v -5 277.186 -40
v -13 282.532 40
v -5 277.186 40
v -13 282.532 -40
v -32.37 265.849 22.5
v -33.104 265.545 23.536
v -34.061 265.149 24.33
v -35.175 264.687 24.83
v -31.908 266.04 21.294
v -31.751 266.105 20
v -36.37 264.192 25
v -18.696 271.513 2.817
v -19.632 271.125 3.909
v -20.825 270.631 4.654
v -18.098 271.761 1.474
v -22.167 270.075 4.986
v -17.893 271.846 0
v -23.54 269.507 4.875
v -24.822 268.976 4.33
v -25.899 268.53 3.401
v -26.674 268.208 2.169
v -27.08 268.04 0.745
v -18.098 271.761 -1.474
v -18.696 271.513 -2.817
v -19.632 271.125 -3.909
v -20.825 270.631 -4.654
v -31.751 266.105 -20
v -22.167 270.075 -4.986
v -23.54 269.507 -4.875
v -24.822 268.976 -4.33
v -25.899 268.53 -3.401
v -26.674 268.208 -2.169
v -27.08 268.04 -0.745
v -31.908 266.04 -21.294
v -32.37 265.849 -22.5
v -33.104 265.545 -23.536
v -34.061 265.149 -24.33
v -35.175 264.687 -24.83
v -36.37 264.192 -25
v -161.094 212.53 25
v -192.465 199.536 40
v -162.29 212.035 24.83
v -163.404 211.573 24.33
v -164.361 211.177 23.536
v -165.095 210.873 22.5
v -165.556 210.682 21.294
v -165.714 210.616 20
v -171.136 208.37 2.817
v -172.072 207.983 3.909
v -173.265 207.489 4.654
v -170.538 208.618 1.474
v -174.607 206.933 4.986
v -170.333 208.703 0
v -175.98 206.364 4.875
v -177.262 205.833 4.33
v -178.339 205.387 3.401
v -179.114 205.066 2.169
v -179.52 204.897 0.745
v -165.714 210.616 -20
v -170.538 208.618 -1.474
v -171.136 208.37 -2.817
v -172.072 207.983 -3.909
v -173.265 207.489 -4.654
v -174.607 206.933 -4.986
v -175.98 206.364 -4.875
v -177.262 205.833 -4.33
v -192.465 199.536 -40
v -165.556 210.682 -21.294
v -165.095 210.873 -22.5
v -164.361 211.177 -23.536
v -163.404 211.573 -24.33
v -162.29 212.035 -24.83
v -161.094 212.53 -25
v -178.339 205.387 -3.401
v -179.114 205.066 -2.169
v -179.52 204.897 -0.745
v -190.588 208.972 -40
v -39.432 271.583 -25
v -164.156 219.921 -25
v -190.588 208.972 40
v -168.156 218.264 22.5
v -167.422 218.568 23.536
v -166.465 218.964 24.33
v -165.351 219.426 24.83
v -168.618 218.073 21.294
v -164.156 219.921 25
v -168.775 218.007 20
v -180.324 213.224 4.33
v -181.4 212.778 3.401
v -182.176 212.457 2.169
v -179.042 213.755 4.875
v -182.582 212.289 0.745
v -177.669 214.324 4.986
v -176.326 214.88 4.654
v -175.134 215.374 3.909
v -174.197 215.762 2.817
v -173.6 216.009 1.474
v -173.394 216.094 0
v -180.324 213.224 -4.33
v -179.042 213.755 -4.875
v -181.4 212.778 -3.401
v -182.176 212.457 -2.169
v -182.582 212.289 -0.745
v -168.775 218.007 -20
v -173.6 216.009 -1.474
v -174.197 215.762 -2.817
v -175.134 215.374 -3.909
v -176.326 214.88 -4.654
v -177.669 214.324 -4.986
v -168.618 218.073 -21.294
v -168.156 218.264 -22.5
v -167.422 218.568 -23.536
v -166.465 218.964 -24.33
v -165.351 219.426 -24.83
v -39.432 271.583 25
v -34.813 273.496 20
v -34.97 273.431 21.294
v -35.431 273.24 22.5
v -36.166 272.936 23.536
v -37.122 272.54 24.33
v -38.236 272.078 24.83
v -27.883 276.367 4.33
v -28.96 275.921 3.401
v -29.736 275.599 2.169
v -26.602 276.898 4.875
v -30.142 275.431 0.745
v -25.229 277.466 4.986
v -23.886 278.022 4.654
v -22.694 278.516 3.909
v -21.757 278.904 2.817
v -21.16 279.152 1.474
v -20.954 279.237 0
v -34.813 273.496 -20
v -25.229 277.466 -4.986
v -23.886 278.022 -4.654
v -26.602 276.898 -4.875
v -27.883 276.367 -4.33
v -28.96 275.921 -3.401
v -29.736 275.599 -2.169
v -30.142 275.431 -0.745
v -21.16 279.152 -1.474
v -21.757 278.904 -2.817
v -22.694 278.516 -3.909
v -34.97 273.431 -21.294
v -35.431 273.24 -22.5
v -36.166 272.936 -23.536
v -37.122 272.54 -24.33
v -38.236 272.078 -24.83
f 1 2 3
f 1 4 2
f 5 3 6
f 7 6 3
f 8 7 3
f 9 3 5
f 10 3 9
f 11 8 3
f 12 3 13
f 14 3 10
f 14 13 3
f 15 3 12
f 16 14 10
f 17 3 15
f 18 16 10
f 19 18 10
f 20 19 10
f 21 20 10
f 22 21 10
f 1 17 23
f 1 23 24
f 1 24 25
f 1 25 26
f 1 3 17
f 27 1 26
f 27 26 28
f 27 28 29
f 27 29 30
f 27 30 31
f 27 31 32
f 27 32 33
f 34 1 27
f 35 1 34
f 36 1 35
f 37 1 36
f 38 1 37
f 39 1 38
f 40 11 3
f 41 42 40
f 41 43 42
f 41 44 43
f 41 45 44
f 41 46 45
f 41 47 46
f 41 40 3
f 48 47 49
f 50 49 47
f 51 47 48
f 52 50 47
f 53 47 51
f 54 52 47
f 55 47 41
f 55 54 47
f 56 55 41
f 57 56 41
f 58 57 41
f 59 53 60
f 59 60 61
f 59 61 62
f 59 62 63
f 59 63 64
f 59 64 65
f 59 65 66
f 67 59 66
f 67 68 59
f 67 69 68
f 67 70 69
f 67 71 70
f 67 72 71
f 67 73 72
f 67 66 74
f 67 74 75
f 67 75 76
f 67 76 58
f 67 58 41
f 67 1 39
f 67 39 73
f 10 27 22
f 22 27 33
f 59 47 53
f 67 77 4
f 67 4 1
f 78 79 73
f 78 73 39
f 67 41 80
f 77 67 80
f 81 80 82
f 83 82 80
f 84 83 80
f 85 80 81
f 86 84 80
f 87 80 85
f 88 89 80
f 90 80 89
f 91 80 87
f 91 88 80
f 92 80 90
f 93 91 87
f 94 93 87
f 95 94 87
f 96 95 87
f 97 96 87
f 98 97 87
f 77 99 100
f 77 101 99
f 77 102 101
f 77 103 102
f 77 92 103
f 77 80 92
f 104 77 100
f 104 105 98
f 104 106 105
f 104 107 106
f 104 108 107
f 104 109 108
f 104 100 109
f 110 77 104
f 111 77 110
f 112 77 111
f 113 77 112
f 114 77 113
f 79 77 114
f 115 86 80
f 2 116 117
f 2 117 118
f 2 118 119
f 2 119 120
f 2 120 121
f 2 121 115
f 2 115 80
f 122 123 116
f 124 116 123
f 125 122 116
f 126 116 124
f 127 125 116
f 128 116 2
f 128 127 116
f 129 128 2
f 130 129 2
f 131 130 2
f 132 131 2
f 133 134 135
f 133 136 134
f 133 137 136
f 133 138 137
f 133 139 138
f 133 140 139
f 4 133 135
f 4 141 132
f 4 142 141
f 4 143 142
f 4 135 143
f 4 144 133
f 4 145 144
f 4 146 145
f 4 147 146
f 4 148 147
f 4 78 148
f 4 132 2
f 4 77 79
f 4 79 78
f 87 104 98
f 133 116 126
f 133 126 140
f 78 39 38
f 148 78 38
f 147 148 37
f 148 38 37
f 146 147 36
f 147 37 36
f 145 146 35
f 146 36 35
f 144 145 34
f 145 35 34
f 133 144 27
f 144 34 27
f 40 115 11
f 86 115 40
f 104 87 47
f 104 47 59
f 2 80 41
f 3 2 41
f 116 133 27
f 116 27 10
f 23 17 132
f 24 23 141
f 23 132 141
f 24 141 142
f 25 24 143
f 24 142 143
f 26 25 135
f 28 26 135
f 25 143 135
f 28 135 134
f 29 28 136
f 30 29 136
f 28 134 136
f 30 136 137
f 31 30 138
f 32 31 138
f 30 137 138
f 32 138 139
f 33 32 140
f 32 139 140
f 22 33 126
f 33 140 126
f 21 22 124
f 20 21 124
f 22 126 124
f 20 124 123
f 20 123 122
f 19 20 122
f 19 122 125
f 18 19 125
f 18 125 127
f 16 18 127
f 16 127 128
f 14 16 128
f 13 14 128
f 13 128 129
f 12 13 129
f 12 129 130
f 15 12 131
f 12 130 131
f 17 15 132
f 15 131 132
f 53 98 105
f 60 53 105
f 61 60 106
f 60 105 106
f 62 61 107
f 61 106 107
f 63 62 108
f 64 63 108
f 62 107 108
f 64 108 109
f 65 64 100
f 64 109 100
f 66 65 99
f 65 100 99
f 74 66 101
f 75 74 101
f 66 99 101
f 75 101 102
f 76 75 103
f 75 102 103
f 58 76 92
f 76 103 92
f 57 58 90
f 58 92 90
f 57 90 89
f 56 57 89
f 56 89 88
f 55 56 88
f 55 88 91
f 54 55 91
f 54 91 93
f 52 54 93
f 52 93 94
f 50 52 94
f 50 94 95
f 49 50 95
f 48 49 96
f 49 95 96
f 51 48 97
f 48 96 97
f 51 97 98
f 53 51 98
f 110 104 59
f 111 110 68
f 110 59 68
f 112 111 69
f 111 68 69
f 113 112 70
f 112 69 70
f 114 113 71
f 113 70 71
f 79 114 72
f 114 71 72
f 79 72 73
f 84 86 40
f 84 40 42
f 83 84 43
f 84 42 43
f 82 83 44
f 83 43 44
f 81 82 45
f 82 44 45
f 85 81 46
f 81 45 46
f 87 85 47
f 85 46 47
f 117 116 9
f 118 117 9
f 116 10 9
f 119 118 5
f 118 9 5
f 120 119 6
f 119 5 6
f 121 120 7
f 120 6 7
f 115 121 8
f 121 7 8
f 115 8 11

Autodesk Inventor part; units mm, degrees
ref_plane "YZ Plane" through (0, 0, 0) normal (1, 0, 0) x (0, 1, 0)
ref_plane "XZ Plane" through (0, 0, 0) normal (0, 1, 0) x (-1, 0, 0)
ref_plane "XY Plane" through (0, 0, 0) normal (0, 0, 1) x (1, 0, 0)
sketch "Sketch2" plane through (0, 0, 0) normal (0, 0, 1) x (1, 0, 0)
  line L0 (0, 273.8452) -> (193.6378, 193.6378) construction
  line L1 (193.6378, 193.6378) -> (273.8452, 0) construction
  line L2 (273.8452, 0) -> (193.6378, -193.6378) construction
  line L3 (193.6378, -193.6378) -> (0, -273.8452) construction
  line L4 (0, -273.8452) -> (-193.6378, -193.6378) construction
  line L5 (-193.6378, -193.6378) -> (-273.8452, 0) construction
  line L6 (-273.8452, 0) -> (-193.6378, 193.6378) construction
  line L7 (-193.6378, 193.6378) -> (0, 273.8452) construction
  line L8 (-193.6378, 193.6378) -> (0, 273.8452) construction
  line L9 (-459.9272, 770.6562) -> (-219.7185, 870.1539) construction
  line L10 (-96.8189, 233.7415) -> (-339.8229, 820.405) construction
  line L11 (-219.7185, 870.1539) -> (0, 870.1539) construction
  line L12 (0, 870.1539) -> (0, 273.8452) construction
  line L13 (-459.9272, 770.6562) -> (-615.2917, 615.2917) construction
  line L14 (-615.2917, 615.2917) -> (-193.6378, 193.6378) construction
  line L15 (-5, 277.1861) -> (-192.4647, 199.5357) construction
  line L16 (-192.4647, 199.5357) -> (-608.2206, 615.2917) construction
  line L17 (-608.2206, 615.2917) -> (-457.095, 766.4174) construction
  line L18 (-457.095, 766.4174) -> (-218.724, 865.1539) construction
  line L19 (-218.724, 865.1539) -> (-5, 865.1539) construction
  line L20 (-5, 865.1539) -> (-5, 277.1861) construction
  line L21 (-13, 282.5315) -> (-190.5876, 208.9724) construction
  line L22 (-190.5876, 208.9724) -> (-596.9069, 615.2917) construction
  line L23 (-596.9069, 615.2917) -> (-452.5633, 759.6353) construction
  line L24 (-452.5633, 759.6353) -> (-217.1327, 857.1539) construction
  line L25 (-217.1327, 857.1539) -> (-13, 857.1539) construction
  line L26 (-13, 857.1539) -> (-13, 282.5315) construction
  line L27 (-5, 277.1861) -> (-192.4647, 199.5357)
  line L28 (-192.4647, 199.5357) -> (-190.5876, 208.9724)
  line L29 (-190.5876, 208.9724) -> (-13, 282.5315)
  line L30 (-13, 282.5315) -> (-5, 277.1861)
  point P0 (0, 0)
  point P1 (0, 0)
  point P2 (0, 0)
  dimension "d0" = 506
  dimension "d1" = 260
  dimension "d2" = 635
  dimension "d6" = 5
  dimension "d7" = 8
extrude "Extrusion1" add sketch "Sketch2" along normal mid plane 80
sketch "Sketch3" plane through (-13, 282.5315, -40) normal (-0.3827, 0.9239, 0) x (0.9239, 0.3827, 0)
  line L0 (-168.6097, -15) -> (-23.6097, -15)
  line L1 (-23.6097, -15) -> (-23.6097, -65)
  line L2 (-23.6097, -65) -> (-168.6097, -65)
  line L3 (-168.6097, -65) -> (-168.6097, -15)
  circle A0 centre (-13.6097, -40) radius 5
  circle A1 centre (-178.6097, -40) radius 5
  line L4 (0, -80) -> (-192.2194, -80) projected
  line L5 (-96.1097, -40) -> (-96.1097, -80) construction
  line L6 (5.3454, 0) -> (5.3454, -80) construction
  point P0 (-96.1097, -15)
  point P1 (-168.6097, -40)
  point P2 (-23.6097, -40)
  point P3 (5.3454, -40)
  dimension "d10" = 145
  dimension "d11" = 10
  dimension "d12" = 10
  dimension "d13" = 50
extrude "Extrusion2" cut sketch "Sketch3" against normal up to surface (8 mm away)
fillet "Fillet1" radius 5 4 edges at (-167.2443, 214.3119, -25) (-33.2818, 269.801, -25) (-33.2818, 269.801, 25) (-167.2443, 214.3119, 25)
equation "\"d0\" = Барабан_габарит_по_кассетам"
equation "\"d1\" = Кассета_длина_грани"
equation "\"d2\" = Кассета_высота"
equation "\"d10\" = Длина_окна_барабан"
equation "\"d11\" = Диам_шпильки_под_кассету"
equation "\"d13\" = Ширина_окна_барабан"
equation "\"Барабан_габарит_по_кассетам\" = 506"
equation "\"Кассета_длина_грани\" = 260"
equation "\"Кассета_высота\" = 635"
equation "\"Длина_окна_барабан\" = 145"
equation "\"Диам_шпильки_под_кассету\" = 10"
equation "\"Ширина_окна_барабан\" = 50"
properties part number "ДМС 204 Нижний лист"
